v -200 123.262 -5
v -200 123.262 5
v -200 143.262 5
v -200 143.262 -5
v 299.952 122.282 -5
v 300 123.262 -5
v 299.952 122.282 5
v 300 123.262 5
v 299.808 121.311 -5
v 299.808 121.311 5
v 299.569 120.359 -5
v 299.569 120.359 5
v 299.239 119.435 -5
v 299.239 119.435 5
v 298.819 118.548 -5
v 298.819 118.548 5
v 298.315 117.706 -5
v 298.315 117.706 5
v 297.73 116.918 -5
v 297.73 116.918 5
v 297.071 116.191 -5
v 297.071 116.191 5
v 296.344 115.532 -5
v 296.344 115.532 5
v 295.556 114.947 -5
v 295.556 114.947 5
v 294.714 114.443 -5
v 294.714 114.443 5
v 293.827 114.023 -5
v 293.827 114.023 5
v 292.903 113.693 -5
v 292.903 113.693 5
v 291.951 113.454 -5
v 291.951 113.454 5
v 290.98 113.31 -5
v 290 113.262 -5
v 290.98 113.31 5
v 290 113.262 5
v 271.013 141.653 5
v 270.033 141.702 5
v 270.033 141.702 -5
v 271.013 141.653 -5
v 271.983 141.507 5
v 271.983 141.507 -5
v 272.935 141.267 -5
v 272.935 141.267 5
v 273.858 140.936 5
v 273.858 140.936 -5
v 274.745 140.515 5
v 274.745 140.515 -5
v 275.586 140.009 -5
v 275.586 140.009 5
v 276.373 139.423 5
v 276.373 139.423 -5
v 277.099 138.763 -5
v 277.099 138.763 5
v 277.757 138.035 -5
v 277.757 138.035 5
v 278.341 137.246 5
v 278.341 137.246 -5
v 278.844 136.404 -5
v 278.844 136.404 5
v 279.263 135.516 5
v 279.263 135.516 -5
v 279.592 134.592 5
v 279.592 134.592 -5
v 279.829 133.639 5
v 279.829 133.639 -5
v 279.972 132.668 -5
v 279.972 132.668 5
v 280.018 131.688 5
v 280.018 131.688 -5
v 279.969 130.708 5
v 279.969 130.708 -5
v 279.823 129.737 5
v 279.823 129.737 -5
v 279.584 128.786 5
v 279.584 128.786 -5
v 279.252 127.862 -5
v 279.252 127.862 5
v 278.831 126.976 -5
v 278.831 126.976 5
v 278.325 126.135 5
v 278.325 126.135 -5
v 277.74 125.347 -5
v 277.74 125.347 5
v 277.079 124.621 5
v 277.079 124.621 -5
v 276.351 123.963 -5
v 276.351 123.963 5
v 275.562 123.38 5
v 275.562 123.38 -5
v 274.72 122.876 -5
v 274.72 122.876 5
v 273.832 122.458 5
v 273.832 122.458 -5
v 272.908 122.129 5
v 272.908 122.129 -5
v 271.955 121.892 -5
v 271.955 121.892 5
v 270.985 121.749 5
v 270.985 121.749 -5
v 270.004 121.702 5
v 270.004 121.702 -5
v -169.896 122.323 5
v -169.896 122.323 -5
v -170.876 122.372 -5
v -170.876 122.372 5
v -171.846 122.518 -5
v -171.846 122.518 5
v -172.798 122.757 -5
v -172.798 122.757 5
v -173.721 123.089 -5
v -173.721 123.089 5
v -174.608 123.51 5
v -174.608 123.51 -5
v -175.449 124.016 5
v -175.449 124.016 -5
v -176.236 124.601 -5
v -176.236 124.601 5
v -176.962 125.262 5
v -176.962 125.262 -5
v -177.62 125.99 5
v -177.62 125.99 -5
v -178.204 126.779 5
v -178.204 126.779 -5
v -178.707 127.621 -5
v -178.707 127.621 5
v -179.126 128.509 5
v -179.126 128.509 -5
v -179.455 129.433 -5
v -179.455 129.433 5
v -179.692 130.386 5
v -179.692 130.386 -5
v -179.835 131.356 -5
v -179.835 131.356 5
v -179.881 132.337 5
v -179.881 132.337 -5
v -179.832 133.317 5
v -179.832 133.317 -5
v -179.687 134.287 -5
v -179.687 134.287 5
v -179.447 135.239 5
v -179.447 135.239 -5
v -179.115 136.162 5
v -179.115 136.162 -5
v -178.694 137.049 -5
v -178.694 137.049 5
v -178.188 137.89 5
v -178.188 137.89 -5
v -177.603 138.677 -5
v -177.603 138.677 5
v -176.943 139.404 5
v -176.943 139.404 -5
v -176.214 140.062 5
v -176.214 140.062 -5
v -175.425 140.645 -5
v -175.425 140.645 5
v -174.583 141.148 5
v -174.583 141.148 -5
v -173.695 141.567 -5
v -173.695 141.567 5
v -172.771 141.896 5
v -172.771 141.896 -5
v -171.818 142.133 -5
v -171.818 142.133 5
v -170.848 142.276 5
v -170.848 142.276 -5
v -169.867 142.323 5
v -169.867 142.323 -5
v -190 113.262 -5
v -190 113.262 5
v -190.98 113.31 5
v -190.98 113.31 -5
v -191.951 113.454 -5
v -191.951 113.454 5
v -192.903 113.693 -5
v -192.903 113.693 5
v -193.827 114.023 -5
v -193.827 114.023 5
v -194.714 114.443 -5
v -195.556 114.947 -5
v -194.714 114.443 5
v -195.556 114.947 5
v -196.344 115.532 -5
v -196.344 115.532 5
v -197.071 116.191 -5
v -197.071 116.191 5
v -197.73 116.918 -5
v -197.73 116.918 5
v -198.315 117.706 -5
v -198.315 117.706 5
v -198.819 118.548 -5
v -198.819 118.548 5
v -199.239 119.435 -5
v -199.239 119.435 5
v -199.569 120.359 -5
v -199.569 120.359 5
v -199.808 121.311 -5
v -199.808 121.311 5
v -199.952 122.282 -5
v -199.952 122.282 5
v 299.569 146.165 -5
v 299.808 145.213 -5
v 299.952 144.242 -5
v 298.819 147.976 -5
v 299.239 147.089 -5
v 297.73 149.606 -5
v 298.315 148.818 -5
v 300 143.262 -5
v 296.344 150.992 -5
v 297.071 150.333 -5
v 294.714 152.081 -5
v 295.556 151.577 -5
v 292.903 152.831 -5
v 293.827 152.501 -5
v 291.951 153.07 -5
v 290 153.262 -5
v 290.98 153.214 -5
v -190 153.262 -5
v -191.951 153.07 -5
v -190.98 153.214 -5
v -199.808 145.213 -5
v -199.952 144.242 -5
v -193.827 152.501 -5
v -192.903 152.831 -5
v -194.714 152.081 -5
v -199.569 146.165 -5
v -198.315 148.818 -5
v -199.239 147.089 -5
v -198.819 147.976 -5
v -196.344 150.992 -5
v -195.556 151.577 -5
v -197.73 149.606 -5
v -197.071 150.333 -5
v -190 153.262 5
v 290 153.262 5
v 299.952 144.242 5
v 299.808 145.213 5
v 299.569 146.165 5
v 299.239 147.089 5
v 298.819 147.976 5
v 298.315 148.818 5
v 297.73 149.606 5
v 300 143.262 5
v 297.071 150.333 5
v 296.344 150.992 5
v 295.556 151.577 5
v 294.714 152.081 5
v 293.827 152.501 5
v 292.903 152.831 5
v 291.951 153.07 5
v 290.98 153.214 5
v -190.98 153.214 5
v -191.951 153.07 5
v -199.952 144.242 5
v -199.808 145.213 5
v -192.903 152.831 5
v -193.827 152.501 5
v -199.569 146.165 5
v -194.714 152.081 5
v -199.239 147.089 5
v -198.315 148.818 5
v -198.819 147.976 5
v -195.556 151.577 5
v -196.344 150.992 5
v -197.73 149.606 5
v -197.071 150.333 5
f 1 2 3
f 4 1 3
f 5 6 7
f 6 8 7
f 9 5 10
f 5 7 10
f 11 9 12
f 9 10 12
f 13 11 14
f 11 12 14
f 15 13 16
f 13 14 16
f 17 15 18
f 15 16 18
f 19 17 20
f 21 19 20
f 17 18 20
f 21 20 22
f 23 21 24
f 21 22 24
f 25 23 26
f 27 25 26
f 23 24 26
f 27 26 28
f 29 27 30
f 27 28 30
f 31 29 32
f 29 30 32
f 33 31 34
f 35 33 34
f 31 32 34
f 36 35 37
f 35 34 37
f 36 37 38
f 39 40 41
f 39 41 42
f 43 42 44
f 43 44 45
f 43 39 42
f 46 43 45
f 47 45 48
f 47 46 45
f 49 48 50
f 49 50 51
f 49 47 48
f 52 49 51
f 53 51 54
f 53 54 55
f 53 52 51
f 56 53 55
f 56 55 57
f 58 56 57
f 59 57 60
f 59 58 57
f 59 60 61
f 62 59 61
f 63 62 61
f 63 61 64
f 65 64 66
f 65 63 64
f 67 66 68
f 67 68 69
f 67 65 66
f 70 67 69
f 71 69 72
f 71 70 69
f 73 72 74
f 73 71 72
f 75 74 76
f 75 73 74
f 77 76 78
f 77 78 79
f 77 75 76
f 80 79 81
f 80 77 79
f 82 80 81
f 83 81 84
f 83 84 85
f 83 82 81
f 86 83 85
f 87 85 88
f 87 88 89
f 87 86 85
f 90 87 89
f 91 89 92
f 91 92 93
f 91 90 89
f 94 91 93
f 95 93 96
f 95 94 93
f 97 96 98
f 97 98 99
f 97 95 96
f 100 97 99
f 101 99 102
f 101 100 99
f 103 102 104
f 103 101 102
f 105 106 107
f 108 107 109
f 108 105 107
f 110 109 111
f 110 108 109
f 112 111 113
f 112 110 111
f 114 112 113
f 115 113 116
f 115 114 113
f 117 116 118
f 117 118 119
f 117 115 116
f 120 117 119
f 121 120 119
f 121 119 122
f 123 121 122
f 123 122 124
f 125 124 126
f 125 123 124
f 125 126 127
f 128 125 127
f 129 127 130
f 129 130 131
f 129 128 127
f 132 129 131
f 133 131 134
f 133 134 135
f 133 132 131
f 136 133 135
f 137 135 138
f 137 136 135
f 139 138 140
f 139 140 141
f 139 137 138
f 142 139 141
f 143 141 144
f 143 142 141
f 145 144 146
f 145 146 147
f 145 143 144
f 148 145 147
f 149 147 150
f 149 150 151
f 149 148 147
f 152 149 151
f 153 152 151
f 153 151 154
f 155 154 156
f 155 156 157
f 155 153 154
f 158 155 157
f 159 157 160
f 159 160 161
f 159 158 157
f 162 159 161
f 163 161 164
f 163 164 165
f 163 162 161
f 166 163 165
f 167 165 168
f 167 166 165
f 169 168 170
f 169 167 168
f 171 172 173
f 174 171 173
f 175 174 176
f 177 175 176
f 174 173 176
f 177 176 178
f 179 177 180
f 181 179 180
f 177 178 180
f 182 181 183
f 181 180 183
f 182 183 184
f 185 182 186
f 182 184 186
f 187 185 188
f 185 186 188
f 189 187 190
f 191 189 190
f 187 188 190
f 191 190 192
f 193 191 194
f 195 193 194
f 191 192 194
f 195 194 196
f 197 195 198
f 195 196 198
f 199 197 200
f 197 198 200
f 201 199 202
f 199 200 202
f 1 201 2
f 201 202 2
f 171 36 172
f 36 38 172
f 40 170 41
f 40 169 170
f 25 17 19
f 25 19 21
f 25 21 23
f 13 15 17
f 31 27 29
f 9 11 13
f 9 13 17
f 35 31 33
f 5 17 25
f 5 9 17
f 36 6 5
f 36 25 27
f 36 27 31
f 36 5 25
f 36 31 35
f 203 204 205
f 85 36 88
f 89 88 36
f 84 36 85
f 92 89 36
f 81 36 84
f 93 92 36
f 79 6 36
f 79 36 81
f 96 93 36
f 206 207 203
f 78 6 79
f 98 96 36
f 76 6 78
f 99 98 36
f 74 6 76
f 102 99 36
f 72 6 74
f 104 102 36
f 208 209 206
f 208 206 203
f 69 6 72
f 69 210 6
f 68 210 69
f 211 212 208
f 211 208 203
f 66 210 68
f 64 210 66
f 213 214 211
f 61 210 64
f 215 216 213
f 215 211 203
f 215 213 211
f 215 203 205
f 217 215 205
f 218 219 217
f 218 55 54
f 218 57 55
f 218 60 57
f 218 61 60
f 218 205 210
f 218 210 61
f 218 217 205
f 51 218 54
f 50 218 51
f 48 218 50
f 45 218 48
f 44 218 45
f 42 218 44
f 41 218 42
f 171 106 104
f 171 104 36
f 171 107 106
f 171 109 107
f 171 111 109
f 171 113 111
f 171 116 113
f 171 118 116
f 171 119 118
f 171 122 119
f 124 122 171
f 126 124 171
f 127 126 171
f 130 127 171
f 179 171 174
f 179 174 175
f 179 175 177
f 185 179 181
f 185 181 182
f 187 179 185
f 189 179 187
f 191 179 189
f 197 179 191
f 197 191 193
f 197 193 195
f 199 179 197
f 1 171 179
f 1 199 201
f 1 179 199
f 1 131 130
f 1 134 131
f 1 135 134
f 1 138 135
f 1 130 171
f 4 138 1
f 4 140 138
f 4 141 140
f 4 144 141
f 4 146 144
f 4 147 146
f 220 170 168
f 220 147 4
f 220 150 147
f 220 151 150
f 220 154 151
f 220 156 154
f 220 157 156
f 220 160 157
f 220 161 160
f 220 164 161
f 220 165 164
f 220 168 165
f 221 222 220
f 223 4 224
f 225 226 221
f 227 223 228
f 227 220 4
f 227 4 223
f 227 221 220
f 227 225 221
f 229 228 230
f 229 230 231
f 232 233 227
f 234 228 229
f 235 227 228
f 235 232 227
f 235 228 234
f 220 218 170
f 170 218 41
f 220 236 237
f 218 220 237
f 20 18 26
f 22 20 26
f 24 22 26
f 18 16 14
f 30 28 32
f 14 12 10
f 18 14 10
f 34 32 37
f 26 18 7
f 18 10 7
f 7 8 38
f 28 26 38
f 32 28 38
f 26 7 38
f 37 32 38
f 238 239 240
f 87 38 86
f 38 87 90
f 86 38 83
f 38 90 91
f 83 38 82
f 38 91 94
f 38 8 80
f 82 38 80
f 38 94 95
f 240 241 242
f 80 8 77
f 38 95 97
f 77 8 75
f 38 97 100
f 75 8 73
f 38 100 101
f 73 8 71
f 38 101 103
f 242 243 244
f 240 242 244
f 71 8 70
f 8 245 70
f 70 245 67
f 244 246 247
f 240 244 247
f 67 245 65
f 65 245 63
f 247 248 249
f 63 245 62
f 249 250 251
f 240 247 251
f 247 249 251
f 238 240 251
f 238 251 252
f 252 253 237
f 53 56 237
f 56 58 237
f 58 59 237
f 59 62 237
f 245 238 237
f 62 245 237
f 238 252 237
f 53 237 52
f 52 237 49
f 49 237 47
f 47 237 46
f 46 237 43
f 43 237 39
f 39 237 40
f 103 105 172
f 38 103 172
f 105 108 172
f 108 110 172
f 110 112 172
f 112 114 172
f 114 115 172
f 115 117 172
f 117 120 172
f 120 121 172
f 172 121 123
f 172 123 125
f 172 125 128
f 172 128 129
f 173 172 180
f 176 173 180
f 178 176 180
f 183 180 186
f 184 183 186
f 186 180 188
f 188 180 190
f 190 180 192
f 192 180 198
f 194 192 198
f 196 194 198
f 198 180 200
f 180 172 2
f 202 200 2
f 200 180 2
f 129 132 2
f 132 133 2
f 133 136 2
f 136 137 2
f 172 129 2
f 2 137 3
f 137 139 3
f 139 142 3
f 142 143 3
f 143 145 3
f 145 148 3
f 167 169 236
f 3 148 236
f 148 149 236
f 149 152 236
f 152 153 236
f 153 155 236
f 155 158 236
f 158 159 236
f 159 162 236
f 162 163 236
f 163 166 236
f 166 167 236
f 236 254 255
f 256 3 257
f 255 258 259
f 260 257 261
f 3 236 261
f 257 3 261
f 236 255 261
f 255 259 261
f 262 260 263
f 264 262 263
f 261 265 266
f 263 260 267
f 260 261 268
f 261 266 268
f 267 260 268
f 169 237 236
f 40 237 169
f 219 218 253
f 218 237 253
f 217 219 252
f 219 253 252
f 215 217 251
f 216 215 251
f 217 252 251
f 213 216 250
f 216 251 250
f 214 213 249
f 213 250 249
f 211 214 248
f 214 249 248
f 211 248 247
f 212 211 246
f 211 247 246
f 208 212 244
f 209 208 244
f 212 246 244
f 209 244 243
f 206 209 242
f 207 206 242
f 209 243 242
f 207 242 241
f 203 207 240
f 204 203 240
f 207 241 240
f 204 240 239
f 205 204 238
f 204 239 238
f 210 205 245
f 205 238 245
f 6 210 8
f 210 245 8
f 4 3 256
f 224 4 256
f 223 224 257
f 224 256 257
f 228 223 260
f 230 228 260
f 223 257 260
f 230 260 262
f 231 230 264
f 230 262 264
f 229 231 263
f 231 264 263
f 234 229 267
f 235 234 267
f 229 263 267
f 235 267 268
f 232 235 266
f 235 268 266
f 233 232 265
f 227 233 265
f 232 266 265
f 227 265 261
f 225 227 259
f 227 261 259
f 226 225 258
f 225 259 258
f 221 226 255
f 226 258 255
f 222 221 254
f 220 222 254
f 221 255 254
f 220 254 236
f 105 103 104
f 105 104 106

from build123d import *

# Parameters (mm, degrees)
BOSS_EXTRUDE1_DEPTH = 5


with BuildPart() as part:
    # Sketch1 → Boss-Extrude1 (new body, symmetric)
    with BuildSketch(Plane.XY):
        with BuildLine():
            Line((-190, 153.262074111), (290, 153.262074111))
            ThreePointArc((290, 153.262074111), (297.071067812, 150.333141922), (300, 143.262074111))
            Line((300, 143.262074111), (300, 123.262074111))
            ThreePointArc((300, 123.262074111), (297.071067812, 116.191006299), (290, 113.262074111))
            Line((290, 113.262074111), (-190, 113.262074111))
            ThreePointArc((-190, 113.262074111), (-197.071067812, 116.191006299), (-200, 123.262074111))
            Line((-200, 123.262074111), (-200, 143.262074111))
            ThreePointArc((-200, 143.262074111), (-197.071067812, 150.333141922), (-190, 153.262074111))
        make_face()
        with BuildLine():
            Line((-169.867316387, 142.322613738), (270.03251135, 141.702162641))
            ThreePointArc((270.03251135, 141.702162641), (280.018397045, 131.68806823), (270.004302633, 121.702182535))
            Line((270.004302633, 121.702182535), (-169.895525104, 122.322633632))
            ThreePointArc((-169.895525104, 122.322633632), (-179.881410799, 132.336728043), (-169.867316387, 142.322613738))
        make_face(mode=Mode.SUBTRACT)
    extrude(amount=BOSS_EXTRUDE1_DEPTH, both=True)


solid = part.part
